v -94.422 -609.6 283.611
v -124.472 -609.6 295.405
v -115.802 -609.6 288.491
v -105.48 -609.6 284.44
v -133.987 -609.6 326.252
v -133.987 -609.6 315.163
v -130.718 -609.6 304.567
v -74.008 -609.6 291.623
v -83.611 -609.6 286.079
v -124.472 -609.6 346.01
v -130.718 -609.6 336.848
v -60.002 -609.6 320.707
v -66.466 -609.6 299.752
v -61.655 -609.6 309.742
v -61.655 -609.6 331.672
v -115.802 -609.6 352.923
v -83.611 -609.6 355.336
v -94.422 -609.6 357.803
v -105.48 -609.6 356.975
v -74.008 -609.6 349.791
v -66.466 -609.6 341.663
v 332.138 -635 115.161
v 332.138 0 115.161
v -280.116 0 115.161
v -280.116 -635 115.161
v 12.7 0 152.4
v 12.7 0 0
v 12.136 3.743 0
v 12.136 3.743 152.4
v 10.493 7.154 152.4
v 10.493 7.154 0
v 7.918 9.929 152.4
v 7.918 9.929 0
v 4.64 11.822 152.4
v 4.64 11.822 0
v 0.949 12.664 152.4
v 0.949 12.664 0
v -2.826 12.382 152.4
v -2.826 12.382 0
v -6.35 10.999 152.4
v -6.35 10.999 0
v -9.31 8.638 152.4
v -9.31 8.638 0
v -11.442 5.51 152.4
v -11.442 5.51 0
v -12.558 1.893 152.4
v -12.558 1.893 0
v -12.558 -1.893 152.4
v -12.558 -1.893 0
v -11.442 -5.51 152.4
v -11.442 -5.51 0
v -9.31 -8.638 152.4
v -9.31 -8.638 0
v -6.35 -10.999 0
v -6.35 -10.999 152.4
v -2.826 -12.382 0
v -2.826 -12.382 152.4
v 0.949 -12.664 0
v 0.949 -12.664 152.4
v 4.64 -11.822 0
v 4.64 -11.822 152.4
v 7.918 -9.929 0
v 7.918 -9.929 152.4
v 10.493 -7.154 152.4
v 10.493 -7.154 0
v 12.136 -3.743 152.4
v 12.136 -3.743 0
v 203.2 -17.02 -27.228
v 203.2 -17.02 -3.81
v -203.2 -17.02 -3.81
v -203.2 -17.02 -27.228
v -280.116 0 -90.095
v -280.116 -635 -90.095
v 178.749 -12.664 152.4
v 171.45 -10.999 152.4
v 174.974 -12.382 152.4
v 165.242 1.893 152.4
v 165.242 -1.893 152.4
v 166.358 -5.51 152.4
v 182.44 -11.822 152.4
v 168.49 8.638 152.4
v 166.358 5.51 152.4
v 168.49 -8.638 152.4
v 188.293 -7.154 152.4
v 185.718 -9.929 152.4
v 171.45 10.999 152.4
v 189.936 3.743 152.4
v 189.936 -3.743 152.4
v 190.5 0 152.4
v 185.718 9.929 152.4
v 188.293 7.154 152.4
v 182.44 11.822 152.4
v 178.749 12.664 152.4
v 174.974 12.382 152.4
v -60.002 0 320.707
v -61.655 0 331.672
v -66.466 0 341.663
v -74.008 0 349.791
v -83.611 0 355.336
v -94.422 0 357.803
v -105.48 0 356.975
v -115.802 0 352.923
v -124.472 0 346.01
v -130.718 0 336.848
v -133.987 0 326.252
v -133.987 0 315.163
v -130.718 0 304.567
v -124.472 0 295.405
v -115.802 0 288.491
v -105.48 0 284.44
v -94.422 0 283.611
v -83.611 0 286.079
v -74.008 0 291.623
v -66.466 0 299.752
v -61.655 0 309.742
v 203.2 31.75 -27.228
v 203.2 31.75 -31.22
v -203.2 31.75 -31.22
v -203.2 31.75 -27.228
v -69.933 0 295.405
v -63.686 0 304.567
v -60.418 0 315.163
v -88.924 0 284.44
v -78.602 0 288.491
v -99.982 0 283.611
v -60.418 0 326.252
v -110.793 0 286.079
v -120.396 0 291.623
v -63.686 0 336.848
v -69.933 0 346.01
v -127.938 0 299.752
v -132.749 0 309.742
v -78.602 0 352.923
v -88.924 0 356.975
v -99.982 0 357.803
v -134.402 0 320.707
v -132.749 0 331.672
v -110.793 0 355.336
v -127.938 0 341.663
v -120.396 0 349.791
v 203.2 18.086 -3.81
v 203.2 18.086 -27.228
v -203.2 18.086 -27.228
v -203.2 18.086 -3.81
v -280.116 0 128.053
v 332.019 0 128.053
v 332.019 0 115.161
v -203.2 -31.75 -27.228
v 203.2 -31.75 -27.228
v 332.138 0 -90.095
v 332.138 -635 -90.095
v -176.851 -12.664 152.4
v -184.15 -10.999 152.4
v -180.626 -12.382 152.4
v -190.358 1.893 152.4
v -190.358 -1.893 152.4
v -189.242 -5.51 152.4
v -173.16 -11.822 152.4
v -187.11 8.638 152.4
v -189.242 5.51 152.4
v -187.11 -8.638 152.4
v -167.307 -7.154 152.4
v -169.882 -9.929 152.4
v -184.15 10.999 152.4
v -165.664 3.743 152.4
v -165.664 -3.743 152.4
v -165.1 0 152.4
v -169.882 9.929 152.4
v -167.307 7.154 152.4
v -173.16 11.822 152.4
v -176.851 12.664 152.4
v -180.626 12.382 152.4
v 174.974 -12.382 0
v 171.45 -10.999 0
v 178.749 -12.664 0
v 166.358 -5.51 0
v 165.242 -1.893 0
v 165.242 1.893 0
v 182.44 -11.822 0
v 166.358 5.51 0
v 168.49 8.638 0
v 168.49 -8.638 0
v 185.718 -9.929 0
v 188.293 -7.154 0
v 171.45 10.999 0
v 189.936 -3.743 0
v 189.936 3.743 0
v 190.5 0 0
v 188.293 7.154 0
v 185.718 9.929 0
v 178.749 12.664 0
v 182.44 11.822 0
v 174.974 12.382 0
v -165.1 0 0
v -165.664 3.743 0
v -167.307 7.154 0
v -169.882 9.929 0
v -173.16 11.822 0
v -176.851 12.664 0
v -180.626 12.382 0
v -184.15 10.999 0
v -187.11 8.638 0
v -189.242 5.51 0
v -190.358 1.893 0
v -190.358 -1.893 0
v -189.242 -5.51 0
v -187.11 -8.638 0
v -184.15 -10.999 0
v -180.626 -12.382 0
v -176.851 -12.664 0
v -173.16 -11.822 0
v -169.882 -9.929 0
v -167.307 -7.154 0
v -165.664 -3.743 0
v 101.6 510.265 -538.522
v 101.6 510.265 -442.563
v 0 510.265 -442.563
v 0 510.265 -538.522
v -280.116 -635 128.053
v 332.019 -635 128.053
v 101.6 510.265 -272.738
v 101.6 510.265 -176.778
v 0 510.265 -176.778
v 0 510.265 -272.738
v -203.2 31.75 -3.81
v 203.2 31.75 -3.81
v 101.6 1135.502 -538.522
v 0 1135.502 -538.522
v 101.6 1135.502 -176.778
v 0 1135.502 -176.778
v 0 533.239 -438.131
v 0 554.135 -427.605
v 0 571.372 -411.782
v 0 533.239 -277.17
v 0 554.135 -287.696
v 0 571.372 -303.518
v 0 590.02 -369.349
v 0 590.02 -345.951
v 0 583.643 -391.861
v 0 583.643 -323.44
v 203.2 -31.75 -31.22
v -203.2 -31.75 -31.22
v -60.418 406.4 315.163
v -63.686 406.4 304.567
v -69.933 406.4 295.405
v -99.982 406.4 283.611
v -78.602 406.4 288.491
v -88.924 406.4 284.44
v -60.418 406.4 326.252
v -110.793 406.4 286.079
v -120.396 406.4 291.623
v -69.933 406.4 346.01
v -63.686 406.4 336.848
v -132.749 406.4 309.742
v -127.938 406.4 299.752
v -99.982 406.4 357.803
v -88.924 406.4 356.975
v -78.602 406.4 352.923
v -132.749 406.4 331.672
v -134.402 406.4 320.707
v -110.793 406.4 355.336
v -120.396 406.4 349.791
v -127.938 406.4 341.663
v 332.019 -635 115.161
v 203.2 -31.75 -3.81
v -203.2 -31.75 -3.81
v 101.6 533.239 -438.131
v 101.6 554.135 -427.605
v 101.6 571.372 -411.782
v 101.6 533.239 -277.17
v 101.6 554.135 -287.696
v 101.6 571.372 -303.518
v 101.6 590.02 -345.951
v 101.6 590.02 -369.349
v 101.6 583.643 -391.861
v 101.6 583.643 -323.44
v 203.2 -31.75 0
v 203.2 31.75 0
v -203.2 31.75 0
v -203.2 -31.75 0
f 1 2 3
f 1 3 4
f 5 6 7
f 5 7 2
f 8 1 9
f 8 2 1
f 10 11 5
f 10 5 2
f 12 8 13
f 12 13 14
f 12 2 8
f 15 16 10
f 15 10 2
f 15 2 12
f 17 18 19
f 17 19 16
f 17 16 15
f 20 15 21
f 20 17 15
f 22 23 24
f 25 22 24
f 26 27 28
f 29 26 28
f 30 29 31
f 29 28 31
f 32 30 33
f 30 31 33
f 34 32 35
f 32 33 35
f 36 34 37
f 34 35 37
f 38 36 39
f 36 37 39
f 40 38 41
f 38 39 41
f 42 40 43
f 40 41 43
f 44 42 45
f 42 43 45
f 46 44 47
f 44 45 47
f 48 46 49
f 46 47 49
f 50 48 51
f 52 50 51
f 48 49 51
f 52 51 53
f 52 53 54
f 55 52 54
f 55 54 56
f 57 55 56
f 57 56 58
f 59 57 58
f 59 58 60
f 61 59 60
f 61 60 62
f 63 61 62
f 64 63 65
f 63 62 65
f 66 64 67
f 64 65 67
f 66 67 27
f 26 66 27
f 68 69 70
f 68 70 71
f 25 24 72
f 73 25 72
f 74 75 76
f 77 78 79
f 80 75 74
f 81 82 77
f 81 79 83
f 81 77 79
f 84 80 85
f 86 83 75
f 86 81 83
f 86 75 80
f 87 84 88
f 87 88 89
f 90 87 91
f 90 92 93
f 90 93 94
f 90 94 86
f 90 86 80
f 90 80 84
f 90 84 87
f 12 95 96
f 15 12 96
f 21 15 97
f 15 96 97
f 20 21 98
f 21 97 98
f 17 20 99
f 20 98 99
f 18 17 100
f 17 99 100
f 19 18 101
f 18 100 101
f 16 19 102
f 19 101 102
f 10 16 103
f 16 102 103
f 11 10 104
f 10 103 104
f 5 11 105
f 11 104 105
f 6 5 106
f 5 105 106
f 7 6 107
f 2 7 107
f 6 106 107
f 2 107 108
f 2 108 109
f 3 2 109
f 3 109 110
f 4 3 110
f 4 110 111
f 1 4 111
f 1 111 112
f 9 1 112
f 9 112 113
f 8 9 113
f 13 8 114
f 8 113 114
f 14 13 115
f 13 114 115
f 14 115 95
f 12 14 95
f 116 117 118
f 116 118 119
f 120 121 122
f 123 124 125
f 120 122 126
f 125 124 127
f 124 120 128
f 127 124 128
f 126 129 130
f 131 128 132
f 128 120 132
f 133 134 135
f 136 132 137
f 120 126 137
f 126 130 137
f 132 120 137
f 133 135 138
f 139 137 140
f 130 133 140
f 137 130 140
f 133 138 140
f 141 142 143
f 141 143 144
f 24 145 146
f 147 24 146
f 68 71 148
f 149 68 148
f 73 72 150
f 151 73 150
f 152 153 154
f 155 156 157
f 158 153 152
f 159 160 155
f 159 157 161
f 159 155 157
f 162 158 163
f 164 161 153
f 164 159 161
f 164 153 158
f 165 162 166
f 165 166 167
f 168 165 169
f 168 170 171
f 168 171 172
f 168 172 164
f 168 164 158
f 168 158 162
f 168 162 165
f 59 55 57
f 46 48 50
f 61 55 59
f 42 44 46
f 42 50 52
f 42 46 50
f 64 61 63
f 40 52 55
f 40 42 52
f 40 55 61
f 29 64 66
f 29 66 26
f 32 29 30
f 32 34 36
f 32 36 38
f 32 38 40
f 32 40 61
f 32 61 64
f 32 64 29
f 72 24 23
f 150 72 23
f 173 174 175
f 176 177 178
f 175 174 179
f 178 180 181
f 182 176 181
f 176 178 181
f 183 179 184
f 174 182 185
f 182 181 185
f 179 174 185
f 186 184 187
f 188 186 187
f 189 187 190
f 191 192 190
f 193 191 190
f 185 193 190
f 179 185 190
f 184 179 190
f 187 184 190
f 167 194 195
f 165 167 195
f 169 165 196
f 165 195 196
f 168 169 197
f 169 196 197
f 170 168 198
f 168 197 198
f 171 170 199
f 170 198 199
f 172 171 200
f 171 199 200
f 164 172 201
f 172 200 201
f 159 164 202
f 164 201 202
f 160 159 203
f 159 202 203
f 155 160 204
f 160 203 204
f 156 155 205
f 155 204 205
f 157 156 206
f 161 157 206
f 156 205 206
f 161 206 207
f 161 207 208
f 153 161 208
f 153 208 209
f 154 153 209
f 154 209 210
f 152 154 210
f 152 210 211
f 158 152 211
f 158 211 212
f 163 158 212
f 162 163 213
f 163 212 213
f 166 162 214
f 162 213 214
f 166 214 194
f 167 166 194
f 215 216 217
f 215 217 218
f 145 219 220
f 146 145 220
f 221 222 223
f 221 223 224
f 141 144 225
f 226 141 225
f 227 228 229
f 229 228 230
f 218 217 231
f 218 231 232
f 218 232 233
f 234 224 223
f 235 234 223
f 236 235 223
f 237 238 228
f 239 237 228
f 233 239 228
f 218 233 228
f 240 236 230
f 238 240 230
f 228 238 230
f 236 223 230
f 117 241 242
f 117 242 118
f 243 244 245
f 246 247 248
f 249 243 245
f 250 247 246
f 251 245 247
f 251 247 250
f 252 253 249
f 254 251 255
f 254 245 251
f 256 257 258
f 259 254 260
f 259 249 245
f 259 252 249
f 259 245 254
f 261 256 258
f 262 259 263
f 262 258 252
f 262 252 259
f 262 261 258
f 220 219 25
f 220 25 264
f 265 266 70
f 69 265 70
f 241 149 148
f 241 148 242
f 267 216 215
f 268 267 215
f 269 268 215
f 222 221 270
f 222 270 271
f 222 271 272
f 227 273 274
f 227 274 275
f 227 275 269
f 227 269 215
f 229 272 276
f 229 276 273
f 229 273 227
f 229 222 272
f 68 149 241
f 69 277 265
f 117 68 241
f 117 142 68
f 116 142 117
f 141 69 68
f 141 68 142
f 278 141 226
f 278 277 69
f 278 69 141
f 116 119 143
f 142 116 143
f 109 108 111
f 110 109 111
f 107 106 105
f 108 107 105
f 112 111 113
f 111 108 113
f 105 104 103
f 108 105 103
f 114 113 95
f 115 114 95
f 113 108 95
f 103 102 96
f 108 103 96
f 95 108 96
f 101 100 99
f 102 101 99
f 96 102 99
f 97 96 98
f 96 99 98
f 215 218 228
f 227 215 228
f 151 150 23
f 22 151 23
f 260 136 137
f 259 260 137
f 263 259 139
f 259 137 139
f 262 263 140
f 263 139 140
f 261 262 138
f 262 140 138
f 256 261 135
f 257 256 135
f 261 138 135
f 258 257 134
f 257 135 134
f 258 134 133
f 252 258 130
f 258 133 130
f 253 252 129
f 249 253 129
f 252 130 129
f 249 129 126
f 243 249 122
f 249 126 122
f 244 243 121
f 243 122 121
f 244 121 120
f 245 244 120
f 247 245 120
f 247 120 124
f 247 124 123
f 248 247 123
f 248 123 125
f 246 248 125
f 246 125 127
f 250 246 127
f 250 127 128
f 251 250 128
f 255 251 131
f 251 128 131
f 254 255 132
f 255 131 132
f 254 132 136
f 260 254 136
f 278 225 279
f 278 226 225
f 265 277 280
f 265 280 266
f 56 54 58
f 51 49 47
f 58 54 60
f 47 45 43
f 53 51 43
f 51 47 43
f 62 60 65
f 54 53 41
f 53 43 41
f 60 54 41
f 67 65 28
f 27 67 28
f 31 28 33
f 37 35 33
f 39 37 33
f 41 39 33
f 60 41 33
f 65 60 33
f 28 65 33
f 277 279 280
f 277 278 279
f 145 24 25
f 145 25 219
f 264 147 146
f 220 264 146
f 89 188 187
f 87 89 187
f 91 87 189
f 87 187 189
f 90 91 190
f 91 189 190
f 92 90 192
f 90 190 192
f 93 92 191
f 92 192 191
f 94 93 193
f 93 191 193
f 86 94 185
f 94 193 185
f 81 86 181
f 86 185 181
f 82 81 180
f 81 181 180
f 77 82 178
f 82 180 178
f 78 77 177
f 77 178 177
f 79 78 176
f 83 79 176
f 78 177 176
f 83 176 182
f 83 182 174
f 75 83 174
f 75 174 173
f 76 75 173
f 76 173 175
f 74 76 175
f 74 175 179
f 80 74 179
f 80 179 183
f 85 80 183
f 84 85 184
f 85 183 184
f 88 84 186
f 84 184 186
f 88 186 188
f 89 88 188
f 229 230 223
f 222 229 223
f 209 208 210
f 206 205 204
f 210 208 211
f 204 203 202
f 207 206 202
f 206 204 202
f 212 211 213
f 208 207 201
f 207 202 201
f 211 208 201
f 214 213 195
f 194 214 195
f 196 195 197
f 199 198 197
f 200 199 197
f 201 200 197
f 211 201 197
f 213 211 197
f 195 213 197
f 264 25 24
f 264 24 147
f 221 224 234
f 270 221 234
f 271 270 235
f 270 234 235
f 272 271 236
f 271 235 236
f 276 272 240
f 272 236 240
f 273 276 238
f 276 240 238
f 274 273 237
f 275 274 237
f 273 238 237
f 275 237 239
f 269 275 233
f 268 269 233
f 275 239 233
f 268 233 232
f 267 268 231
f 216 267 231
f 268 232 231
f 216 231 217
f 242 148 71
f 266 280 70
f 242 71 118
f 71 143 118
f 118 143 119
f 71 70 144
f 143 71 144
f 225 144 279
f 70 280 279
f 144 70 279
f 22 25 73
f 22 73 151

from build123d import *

# Parameters (mm, degrees)
F0_R      = 12.7
F1_DEPTH  = 152.4
F2_W      = 35.1061299443
F2_H      = 23.4181114012
F2_H_2    = 0.2155452967
F3_DEPTH  = 203.2
F4_R      = 37.1999854541
F5_DEPTH  = 609.6
F6_R      = 37.1999854541
F7_DEPTH  = 406.4
F9_DEPTH  = 635
F8_W      = 612.1351420879
F8_H      = 12.8926187754
F10_DEPTH = 635
F12_DEPTH = 101.6


with BuildPart() as f1:
    # F0 (on Top) → F1 (new body)
    with BuildSketch(Plane.XY):
        with Locations((-177.8, 0)):
            Circle(F0_R)
    extrude(amount=F1_DEPTH)


with BuildPart() as f1b:
    # F0 (on Top) → F1, piece 2 (new body)
    with BuildSketch(Plane.XY):
        with Locations((177.8, 0)):
            Circle(F0_R)
    extrude(amount=F1_DEPTH)


with BuildPart() as f1c:
    # F0 (on Top) → F1, piece 3 (new body)
    with BuildSketch(Plane.XY):
        Circle(F0_R)
    extrude(amount=F1_DEPTH)


with BuildPart() as f3:
    # F2 (on Right) → F3 (new body, symmetric)
    with BuildSketch(Plane.YZ):
        Polygon((31.75, 0), (-31.75, 0), (-31.75, -3.81), (-17.0204080641, -3.81), (18.0857218802, -3.81), (31.75, -3.81), align=None)
        with Locations((0.532656908, -15.5190557006)):
            Rectangle(F2_W, F2_H)
        with Locations((0.532656908, -27.3358840495)):
            Rectangle(F2_W, F2_H_2)
        Polygon((-17.0204080641, -27.4436566979), (-17.0204080641, -27.2281114012), (-31.75, -27.2281114012), (-31.75, -31.2200188637), (31.75, -31.2200188637), (31.75, -27.2281114012), (18.0857218802, -27.2281114012), (18.0857218802, -27.4436566979), align=None)
    extrude(amount=F3_DEPTH, both=True)


with BuildPart() as f5:
    # F4 (on Front) → F5 (new body)
    with BuildSketch(Plane.XZ):
        with Locations((-97.2021073103, 320.70723176)):
            Circle(F4_R)
    extrude(amount=F5_DEPTH)


with BuildPart() as f7:
    # F6 (on face) → F7 (new body)
    with BuildSketch(Plane(origin=(0, 0, 0), x_dir=(-1, 0, 0), z_dir=(0, 1, 0))):
        with Locations((97.2021073103, 320.70723176)):
            Circle(F6_R)
    extrude(amount=F7_DEPTH)


with BuildPart() as f9:
    # F8 (on Front) → F9 (new body)
    with BuildSketch(Plane.XZ):
        Polygon((332.1379125118, -90.0954529643), (332.1379125118, 115.1605397463), (332.0188820362, 115.1605397463), (-280.1162600517, 115.1605397463), (-280.1162600517, -90.0954529643), align=None)
    extrude(amount=F9_DEPTH)


with BuildPart() as f10:
    # F8 (on Front) → F10 (new body)
    with BuildSketch(Plane.XZ):
        with Locations((25.9513109922, 121.606849134)):
            Rectangle(F8_W, F8_H)
    extrude(amount=F10_DEPTH)


with BuildPart() as f12:
    # F11 (on Right) → F12 (new body)
    with BuildSketch(Plane.YZ):
        with BuildLine():
            Line((1135.5024576187, -176.7779588699), (510.2651119232, -176.7779588699))
            Line((510.2651119232, -176.7779588699), (510.2651119232, -272.7377929515))
            ThreePointArc((510.2651119232, -272.7377929515), (590.828846816, -357.6501607895), (510.2651119232, -442.5625286275))
            Line((510.2651119232, -442.5625286275), (510.2651119232, -538.522362709))
            Line((510.2651119232, -538.522362709), (1135.5024576187, -538.522362709))
            Line((1135.5024576187, -538.522362709), (1135.5024576187, -176.7779588699))
        make_face()
    extrude(amount=F12_DEPTH)


solid = Compound([f1.part, f1b.part, f1c.part, f3.part, f5.part, f7.part, f9.part, f10.part, f12.part])
